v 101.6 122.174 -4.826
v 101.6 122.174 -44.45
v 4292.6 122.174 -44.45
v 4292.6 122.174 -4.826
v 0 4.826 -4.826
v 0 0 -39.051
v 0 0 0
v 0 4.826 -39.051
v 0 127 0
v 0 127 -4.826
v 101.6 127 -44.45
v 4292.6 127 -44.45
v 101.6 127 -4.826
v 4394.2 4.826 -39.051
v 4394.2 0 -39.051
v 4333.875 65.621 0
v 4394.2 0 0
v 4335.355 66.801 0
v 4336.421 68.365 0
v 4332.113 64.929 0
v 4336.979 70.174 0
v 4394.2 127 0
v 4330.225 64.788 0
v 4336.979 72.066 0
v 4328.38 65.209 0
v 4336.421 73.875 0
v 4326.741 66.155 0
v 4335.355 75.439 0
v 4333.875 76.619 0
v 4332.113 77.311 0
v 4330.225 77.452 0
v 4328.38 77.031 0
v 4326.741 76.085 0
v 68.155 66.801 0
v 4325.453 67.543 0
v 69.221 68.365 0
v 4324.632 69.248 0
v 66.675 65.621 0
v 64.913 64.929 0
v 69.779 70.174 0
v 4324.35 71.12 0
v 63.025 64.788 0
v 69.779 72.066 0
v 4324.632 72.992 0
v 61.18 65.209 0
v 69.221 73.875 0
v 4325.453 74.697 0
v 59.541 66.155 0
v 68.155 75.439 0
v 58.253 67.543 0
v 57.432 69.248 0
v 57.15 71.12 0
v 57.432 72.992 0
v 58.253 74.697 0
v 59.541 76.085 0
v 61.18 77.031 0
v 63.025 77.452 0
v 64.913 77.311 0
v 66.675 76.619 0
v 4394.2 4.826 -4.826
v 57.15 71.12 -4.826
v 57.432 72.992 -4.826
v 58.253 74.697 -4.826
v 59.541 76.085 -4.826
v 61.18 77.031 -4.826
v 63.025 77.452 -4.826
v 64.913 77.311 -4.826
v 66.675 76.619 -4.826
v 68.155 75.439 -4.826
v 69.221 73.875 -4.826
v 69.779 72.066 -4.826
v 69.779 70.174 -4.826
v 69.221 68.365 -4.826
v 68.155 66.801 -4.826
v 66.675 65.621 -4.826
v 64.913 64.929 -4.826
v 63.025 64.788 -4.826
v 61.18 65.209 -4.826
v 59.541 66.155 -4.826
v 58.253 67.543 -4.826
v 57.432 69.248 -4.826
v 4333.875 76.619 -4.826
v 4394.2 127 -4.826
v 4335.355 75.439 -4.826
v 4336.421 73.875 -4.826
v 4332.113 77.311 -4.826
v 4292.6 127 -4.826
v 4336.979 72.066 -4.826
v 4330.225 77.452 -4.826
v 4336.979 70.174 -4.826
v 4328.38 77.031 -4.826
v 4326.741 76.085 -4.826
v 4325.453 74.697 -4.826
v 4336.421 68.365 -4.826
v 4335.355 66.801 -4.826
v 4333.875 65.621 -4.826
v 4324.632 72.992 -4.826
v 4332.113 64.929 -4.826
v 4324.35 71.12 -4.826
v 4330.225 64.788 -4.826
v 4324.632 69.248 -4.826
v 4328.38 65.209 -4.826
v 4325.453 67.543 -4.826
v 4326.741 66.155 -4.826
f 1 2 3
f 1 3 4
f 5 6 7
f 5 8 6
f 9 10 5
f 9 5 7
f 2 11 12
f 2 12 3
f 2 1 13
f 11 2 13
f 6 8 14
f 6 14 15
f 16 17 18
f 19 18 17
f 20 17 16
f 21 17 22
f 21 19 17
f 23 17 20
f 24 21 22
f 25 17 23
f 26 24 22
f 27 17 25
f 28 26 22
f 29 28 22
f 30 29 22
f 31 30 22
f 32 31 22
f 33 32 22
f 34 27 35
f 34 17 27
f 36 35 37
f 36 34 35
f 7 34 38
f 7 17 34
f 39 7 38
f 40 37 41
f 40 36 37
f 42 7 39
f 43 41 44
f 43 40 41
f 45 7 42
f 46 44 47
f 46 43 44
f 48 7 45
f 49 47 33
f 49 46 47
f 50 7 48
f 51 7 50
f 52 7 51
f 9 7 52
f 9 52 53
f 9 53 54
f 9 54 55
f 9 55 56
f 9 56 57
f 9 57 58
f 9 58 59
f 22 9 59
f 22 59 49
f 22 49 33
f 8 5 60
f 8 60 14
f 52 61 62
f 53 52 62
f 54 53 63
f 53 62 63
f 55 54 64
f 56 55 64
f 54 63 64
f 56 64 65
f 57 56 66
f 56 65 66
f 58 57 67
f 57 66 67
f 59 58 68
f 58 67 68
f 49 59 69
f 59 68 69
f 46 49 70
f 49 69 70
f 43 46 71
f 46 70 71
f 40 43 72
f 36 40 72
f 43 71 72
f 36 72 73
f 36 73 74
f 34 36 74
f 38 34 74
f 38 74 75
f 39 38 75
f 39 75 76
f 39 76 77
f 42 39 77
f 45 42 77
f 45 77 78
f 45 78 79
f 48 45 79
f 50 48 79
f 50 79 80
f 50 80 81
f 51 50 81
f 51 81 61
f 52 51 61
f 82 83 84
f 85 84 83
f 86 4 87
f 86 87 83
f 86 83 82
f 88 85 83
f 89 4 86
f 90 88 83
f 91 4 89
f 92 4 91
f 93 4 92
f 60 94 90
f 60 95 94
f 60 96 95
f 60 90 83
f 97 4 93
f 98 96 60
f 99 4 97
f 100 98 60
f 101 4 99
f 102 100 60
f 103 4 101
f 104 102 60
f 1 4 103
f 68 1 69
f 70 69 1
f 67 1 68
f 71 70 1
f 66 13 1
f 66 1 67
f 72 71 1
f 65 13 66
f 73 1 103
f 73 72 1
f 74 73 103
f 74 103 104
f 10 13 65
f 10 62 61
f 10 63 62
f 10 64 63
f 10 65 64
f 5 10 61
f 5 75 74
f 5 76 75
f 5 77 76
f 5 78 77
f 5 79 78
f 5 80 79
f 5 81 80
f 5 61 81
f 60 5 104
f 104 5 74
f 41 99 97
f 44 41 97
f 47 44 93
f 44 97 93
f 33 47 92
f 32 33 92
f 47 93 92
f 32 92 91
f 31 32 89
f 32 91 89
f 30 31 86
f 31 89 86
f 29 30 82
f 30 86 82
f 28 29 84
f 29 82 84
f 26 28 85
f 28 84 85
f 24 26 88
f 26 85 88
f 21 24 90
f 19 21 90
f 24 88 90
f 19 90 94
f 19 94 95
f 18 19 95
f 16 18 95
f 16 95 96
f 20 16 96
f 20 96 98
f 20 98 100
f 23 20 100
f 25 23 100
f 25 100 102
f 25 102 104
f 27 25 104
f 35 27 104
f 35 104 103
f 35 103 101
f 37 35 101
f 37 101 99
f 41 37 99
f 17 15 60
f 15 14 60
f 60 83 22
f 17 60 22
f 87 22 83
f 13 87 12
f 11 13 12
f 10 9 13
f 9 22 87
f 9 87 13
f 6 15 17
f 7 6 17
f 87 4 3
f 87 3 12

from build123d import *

# Parameters (mm, degrees)
BOSS_EXTRUDE1_DEPTH = 4394.2
CUT_EXTRUDE1_REACH  = 4398.213
SKETCH2_R           = 6.35
CUT_EXTRUDE4_REACH  = 4398.213
SKETCH3_W           = 101.6
SKETCH3_H           = 4.826


with BuildPart() as part:
    # Sketch1 → Boss-Extrude1 (new body)
    with BuildSketch(Plane(origin=(0, 0, 0), x_dir=(0, 0, -1), z_dir=(1, 0, 0))):
        Polygon((0, 0), (0, 127), (44.45, 127), (44.45, 122.174), (4.826, 122.174), (4.826, 4.826), (39.050693766, 4.826), (39.050693766, 0), align=None)
    extrude(amount=BOSS_EXTRUDE1_DEPTH)

    # Sketch2 → Cut-Extrude1 (cut, up to next)
    with BuildSketch(Plane(origin=(0, 0, -4.826), x_dir=(-1, 0, 0), z_dir=(0, 0, -1)), mode=Mode.PRIVATE) as cut_extrude1_sk1:
        with Locations((-4330.7, 71.12)):
            Circle(SKETCH2_R)
    cut_extrude1_tool1 = extrude(cut_extrude1_sk1.sketch, amount=-CUT_EXTRUDE1_REACH, mode=Mode.PRIVATE) & part.part
    # Sketch2 → Cut-Extrude1 (cut, up to next)
    with BuildSketch(Plane(origin=(0, 0, -4.826), x_dir=(-1, 0, 0), z_dir=(0, 0, -1)), mode=Mode.PRIVATE) as cut_extrude1_sk2:
        with Locations((-63.5, 71.12)):
            Circle(SKETCH2_R)
    cut_extrude1_tool2 = extrude(cut_extrude1_sk2.sketch, amount=-CUT_EXTRUDE1_REACH, mode=Mode.PRIVATE) & part.part
    add(cut_extrude1_tool1.solids().sort_by_distance((4330.7, 71.12, -4.826))[0], mode=Mode.SUBTRACT)
    add(cut_extrude1_tool2.solids().sort_by_distance((63.5, 71.12, -4.826))[0], mode=Mode.SUBTRACT)

    # Sketch3 → Cut-Extrude4 (cut, up to next)
    with BuildSketch(Plane(origin=(0, 0, -4.826), x_dir=(-1, 0, 0), z_dir=(0, 0, -1)), mode=Mode.PRIVATE) as cut_extrude4_sk1:
        with Locations((-4343.4, 124.587)):
            Rectangle(SKETCH3_W, SKETCH3_H)
    cut_extrude4_tool1 = extrude(cut_extrude4_sk1.sketch, amount=CUT_EXTRUDE4_REACH, mode=Mode.PRIVATE) & part.part
    # Sketch3 → Cut-Extrude4 (cut, up to next)
    with BuildSketch(Plane(origin=(0, 0, -4.826), x_dir=(-1, 0, 0), z_dir=(0, 0, -1)), mode=Mode.PRIVATE) as cut_extrude4_sk2:
        with Locations((-50.8, 124.587)):
            Rectangle(SKETCH3_W, SKETCH3_H)
    cut_extrude4_tool2 = extrude(cut_extrude4_sk2.sketch, amount=CUT_EXTRUDE4_REACH, mode=Mode.PRIVATE) & part.part
    add(cut_extrude4_tool1.solids().sort_by_distance((4343.4, 124.587, -4.826))[0], mode=Mode.SUBTRACT)
    add(cut_extrude4_tool2.solids().sort_by_distance((50.8, 124.587, -4.826))[0], mode=Mode.SUBTRACT)


solid = part.part
